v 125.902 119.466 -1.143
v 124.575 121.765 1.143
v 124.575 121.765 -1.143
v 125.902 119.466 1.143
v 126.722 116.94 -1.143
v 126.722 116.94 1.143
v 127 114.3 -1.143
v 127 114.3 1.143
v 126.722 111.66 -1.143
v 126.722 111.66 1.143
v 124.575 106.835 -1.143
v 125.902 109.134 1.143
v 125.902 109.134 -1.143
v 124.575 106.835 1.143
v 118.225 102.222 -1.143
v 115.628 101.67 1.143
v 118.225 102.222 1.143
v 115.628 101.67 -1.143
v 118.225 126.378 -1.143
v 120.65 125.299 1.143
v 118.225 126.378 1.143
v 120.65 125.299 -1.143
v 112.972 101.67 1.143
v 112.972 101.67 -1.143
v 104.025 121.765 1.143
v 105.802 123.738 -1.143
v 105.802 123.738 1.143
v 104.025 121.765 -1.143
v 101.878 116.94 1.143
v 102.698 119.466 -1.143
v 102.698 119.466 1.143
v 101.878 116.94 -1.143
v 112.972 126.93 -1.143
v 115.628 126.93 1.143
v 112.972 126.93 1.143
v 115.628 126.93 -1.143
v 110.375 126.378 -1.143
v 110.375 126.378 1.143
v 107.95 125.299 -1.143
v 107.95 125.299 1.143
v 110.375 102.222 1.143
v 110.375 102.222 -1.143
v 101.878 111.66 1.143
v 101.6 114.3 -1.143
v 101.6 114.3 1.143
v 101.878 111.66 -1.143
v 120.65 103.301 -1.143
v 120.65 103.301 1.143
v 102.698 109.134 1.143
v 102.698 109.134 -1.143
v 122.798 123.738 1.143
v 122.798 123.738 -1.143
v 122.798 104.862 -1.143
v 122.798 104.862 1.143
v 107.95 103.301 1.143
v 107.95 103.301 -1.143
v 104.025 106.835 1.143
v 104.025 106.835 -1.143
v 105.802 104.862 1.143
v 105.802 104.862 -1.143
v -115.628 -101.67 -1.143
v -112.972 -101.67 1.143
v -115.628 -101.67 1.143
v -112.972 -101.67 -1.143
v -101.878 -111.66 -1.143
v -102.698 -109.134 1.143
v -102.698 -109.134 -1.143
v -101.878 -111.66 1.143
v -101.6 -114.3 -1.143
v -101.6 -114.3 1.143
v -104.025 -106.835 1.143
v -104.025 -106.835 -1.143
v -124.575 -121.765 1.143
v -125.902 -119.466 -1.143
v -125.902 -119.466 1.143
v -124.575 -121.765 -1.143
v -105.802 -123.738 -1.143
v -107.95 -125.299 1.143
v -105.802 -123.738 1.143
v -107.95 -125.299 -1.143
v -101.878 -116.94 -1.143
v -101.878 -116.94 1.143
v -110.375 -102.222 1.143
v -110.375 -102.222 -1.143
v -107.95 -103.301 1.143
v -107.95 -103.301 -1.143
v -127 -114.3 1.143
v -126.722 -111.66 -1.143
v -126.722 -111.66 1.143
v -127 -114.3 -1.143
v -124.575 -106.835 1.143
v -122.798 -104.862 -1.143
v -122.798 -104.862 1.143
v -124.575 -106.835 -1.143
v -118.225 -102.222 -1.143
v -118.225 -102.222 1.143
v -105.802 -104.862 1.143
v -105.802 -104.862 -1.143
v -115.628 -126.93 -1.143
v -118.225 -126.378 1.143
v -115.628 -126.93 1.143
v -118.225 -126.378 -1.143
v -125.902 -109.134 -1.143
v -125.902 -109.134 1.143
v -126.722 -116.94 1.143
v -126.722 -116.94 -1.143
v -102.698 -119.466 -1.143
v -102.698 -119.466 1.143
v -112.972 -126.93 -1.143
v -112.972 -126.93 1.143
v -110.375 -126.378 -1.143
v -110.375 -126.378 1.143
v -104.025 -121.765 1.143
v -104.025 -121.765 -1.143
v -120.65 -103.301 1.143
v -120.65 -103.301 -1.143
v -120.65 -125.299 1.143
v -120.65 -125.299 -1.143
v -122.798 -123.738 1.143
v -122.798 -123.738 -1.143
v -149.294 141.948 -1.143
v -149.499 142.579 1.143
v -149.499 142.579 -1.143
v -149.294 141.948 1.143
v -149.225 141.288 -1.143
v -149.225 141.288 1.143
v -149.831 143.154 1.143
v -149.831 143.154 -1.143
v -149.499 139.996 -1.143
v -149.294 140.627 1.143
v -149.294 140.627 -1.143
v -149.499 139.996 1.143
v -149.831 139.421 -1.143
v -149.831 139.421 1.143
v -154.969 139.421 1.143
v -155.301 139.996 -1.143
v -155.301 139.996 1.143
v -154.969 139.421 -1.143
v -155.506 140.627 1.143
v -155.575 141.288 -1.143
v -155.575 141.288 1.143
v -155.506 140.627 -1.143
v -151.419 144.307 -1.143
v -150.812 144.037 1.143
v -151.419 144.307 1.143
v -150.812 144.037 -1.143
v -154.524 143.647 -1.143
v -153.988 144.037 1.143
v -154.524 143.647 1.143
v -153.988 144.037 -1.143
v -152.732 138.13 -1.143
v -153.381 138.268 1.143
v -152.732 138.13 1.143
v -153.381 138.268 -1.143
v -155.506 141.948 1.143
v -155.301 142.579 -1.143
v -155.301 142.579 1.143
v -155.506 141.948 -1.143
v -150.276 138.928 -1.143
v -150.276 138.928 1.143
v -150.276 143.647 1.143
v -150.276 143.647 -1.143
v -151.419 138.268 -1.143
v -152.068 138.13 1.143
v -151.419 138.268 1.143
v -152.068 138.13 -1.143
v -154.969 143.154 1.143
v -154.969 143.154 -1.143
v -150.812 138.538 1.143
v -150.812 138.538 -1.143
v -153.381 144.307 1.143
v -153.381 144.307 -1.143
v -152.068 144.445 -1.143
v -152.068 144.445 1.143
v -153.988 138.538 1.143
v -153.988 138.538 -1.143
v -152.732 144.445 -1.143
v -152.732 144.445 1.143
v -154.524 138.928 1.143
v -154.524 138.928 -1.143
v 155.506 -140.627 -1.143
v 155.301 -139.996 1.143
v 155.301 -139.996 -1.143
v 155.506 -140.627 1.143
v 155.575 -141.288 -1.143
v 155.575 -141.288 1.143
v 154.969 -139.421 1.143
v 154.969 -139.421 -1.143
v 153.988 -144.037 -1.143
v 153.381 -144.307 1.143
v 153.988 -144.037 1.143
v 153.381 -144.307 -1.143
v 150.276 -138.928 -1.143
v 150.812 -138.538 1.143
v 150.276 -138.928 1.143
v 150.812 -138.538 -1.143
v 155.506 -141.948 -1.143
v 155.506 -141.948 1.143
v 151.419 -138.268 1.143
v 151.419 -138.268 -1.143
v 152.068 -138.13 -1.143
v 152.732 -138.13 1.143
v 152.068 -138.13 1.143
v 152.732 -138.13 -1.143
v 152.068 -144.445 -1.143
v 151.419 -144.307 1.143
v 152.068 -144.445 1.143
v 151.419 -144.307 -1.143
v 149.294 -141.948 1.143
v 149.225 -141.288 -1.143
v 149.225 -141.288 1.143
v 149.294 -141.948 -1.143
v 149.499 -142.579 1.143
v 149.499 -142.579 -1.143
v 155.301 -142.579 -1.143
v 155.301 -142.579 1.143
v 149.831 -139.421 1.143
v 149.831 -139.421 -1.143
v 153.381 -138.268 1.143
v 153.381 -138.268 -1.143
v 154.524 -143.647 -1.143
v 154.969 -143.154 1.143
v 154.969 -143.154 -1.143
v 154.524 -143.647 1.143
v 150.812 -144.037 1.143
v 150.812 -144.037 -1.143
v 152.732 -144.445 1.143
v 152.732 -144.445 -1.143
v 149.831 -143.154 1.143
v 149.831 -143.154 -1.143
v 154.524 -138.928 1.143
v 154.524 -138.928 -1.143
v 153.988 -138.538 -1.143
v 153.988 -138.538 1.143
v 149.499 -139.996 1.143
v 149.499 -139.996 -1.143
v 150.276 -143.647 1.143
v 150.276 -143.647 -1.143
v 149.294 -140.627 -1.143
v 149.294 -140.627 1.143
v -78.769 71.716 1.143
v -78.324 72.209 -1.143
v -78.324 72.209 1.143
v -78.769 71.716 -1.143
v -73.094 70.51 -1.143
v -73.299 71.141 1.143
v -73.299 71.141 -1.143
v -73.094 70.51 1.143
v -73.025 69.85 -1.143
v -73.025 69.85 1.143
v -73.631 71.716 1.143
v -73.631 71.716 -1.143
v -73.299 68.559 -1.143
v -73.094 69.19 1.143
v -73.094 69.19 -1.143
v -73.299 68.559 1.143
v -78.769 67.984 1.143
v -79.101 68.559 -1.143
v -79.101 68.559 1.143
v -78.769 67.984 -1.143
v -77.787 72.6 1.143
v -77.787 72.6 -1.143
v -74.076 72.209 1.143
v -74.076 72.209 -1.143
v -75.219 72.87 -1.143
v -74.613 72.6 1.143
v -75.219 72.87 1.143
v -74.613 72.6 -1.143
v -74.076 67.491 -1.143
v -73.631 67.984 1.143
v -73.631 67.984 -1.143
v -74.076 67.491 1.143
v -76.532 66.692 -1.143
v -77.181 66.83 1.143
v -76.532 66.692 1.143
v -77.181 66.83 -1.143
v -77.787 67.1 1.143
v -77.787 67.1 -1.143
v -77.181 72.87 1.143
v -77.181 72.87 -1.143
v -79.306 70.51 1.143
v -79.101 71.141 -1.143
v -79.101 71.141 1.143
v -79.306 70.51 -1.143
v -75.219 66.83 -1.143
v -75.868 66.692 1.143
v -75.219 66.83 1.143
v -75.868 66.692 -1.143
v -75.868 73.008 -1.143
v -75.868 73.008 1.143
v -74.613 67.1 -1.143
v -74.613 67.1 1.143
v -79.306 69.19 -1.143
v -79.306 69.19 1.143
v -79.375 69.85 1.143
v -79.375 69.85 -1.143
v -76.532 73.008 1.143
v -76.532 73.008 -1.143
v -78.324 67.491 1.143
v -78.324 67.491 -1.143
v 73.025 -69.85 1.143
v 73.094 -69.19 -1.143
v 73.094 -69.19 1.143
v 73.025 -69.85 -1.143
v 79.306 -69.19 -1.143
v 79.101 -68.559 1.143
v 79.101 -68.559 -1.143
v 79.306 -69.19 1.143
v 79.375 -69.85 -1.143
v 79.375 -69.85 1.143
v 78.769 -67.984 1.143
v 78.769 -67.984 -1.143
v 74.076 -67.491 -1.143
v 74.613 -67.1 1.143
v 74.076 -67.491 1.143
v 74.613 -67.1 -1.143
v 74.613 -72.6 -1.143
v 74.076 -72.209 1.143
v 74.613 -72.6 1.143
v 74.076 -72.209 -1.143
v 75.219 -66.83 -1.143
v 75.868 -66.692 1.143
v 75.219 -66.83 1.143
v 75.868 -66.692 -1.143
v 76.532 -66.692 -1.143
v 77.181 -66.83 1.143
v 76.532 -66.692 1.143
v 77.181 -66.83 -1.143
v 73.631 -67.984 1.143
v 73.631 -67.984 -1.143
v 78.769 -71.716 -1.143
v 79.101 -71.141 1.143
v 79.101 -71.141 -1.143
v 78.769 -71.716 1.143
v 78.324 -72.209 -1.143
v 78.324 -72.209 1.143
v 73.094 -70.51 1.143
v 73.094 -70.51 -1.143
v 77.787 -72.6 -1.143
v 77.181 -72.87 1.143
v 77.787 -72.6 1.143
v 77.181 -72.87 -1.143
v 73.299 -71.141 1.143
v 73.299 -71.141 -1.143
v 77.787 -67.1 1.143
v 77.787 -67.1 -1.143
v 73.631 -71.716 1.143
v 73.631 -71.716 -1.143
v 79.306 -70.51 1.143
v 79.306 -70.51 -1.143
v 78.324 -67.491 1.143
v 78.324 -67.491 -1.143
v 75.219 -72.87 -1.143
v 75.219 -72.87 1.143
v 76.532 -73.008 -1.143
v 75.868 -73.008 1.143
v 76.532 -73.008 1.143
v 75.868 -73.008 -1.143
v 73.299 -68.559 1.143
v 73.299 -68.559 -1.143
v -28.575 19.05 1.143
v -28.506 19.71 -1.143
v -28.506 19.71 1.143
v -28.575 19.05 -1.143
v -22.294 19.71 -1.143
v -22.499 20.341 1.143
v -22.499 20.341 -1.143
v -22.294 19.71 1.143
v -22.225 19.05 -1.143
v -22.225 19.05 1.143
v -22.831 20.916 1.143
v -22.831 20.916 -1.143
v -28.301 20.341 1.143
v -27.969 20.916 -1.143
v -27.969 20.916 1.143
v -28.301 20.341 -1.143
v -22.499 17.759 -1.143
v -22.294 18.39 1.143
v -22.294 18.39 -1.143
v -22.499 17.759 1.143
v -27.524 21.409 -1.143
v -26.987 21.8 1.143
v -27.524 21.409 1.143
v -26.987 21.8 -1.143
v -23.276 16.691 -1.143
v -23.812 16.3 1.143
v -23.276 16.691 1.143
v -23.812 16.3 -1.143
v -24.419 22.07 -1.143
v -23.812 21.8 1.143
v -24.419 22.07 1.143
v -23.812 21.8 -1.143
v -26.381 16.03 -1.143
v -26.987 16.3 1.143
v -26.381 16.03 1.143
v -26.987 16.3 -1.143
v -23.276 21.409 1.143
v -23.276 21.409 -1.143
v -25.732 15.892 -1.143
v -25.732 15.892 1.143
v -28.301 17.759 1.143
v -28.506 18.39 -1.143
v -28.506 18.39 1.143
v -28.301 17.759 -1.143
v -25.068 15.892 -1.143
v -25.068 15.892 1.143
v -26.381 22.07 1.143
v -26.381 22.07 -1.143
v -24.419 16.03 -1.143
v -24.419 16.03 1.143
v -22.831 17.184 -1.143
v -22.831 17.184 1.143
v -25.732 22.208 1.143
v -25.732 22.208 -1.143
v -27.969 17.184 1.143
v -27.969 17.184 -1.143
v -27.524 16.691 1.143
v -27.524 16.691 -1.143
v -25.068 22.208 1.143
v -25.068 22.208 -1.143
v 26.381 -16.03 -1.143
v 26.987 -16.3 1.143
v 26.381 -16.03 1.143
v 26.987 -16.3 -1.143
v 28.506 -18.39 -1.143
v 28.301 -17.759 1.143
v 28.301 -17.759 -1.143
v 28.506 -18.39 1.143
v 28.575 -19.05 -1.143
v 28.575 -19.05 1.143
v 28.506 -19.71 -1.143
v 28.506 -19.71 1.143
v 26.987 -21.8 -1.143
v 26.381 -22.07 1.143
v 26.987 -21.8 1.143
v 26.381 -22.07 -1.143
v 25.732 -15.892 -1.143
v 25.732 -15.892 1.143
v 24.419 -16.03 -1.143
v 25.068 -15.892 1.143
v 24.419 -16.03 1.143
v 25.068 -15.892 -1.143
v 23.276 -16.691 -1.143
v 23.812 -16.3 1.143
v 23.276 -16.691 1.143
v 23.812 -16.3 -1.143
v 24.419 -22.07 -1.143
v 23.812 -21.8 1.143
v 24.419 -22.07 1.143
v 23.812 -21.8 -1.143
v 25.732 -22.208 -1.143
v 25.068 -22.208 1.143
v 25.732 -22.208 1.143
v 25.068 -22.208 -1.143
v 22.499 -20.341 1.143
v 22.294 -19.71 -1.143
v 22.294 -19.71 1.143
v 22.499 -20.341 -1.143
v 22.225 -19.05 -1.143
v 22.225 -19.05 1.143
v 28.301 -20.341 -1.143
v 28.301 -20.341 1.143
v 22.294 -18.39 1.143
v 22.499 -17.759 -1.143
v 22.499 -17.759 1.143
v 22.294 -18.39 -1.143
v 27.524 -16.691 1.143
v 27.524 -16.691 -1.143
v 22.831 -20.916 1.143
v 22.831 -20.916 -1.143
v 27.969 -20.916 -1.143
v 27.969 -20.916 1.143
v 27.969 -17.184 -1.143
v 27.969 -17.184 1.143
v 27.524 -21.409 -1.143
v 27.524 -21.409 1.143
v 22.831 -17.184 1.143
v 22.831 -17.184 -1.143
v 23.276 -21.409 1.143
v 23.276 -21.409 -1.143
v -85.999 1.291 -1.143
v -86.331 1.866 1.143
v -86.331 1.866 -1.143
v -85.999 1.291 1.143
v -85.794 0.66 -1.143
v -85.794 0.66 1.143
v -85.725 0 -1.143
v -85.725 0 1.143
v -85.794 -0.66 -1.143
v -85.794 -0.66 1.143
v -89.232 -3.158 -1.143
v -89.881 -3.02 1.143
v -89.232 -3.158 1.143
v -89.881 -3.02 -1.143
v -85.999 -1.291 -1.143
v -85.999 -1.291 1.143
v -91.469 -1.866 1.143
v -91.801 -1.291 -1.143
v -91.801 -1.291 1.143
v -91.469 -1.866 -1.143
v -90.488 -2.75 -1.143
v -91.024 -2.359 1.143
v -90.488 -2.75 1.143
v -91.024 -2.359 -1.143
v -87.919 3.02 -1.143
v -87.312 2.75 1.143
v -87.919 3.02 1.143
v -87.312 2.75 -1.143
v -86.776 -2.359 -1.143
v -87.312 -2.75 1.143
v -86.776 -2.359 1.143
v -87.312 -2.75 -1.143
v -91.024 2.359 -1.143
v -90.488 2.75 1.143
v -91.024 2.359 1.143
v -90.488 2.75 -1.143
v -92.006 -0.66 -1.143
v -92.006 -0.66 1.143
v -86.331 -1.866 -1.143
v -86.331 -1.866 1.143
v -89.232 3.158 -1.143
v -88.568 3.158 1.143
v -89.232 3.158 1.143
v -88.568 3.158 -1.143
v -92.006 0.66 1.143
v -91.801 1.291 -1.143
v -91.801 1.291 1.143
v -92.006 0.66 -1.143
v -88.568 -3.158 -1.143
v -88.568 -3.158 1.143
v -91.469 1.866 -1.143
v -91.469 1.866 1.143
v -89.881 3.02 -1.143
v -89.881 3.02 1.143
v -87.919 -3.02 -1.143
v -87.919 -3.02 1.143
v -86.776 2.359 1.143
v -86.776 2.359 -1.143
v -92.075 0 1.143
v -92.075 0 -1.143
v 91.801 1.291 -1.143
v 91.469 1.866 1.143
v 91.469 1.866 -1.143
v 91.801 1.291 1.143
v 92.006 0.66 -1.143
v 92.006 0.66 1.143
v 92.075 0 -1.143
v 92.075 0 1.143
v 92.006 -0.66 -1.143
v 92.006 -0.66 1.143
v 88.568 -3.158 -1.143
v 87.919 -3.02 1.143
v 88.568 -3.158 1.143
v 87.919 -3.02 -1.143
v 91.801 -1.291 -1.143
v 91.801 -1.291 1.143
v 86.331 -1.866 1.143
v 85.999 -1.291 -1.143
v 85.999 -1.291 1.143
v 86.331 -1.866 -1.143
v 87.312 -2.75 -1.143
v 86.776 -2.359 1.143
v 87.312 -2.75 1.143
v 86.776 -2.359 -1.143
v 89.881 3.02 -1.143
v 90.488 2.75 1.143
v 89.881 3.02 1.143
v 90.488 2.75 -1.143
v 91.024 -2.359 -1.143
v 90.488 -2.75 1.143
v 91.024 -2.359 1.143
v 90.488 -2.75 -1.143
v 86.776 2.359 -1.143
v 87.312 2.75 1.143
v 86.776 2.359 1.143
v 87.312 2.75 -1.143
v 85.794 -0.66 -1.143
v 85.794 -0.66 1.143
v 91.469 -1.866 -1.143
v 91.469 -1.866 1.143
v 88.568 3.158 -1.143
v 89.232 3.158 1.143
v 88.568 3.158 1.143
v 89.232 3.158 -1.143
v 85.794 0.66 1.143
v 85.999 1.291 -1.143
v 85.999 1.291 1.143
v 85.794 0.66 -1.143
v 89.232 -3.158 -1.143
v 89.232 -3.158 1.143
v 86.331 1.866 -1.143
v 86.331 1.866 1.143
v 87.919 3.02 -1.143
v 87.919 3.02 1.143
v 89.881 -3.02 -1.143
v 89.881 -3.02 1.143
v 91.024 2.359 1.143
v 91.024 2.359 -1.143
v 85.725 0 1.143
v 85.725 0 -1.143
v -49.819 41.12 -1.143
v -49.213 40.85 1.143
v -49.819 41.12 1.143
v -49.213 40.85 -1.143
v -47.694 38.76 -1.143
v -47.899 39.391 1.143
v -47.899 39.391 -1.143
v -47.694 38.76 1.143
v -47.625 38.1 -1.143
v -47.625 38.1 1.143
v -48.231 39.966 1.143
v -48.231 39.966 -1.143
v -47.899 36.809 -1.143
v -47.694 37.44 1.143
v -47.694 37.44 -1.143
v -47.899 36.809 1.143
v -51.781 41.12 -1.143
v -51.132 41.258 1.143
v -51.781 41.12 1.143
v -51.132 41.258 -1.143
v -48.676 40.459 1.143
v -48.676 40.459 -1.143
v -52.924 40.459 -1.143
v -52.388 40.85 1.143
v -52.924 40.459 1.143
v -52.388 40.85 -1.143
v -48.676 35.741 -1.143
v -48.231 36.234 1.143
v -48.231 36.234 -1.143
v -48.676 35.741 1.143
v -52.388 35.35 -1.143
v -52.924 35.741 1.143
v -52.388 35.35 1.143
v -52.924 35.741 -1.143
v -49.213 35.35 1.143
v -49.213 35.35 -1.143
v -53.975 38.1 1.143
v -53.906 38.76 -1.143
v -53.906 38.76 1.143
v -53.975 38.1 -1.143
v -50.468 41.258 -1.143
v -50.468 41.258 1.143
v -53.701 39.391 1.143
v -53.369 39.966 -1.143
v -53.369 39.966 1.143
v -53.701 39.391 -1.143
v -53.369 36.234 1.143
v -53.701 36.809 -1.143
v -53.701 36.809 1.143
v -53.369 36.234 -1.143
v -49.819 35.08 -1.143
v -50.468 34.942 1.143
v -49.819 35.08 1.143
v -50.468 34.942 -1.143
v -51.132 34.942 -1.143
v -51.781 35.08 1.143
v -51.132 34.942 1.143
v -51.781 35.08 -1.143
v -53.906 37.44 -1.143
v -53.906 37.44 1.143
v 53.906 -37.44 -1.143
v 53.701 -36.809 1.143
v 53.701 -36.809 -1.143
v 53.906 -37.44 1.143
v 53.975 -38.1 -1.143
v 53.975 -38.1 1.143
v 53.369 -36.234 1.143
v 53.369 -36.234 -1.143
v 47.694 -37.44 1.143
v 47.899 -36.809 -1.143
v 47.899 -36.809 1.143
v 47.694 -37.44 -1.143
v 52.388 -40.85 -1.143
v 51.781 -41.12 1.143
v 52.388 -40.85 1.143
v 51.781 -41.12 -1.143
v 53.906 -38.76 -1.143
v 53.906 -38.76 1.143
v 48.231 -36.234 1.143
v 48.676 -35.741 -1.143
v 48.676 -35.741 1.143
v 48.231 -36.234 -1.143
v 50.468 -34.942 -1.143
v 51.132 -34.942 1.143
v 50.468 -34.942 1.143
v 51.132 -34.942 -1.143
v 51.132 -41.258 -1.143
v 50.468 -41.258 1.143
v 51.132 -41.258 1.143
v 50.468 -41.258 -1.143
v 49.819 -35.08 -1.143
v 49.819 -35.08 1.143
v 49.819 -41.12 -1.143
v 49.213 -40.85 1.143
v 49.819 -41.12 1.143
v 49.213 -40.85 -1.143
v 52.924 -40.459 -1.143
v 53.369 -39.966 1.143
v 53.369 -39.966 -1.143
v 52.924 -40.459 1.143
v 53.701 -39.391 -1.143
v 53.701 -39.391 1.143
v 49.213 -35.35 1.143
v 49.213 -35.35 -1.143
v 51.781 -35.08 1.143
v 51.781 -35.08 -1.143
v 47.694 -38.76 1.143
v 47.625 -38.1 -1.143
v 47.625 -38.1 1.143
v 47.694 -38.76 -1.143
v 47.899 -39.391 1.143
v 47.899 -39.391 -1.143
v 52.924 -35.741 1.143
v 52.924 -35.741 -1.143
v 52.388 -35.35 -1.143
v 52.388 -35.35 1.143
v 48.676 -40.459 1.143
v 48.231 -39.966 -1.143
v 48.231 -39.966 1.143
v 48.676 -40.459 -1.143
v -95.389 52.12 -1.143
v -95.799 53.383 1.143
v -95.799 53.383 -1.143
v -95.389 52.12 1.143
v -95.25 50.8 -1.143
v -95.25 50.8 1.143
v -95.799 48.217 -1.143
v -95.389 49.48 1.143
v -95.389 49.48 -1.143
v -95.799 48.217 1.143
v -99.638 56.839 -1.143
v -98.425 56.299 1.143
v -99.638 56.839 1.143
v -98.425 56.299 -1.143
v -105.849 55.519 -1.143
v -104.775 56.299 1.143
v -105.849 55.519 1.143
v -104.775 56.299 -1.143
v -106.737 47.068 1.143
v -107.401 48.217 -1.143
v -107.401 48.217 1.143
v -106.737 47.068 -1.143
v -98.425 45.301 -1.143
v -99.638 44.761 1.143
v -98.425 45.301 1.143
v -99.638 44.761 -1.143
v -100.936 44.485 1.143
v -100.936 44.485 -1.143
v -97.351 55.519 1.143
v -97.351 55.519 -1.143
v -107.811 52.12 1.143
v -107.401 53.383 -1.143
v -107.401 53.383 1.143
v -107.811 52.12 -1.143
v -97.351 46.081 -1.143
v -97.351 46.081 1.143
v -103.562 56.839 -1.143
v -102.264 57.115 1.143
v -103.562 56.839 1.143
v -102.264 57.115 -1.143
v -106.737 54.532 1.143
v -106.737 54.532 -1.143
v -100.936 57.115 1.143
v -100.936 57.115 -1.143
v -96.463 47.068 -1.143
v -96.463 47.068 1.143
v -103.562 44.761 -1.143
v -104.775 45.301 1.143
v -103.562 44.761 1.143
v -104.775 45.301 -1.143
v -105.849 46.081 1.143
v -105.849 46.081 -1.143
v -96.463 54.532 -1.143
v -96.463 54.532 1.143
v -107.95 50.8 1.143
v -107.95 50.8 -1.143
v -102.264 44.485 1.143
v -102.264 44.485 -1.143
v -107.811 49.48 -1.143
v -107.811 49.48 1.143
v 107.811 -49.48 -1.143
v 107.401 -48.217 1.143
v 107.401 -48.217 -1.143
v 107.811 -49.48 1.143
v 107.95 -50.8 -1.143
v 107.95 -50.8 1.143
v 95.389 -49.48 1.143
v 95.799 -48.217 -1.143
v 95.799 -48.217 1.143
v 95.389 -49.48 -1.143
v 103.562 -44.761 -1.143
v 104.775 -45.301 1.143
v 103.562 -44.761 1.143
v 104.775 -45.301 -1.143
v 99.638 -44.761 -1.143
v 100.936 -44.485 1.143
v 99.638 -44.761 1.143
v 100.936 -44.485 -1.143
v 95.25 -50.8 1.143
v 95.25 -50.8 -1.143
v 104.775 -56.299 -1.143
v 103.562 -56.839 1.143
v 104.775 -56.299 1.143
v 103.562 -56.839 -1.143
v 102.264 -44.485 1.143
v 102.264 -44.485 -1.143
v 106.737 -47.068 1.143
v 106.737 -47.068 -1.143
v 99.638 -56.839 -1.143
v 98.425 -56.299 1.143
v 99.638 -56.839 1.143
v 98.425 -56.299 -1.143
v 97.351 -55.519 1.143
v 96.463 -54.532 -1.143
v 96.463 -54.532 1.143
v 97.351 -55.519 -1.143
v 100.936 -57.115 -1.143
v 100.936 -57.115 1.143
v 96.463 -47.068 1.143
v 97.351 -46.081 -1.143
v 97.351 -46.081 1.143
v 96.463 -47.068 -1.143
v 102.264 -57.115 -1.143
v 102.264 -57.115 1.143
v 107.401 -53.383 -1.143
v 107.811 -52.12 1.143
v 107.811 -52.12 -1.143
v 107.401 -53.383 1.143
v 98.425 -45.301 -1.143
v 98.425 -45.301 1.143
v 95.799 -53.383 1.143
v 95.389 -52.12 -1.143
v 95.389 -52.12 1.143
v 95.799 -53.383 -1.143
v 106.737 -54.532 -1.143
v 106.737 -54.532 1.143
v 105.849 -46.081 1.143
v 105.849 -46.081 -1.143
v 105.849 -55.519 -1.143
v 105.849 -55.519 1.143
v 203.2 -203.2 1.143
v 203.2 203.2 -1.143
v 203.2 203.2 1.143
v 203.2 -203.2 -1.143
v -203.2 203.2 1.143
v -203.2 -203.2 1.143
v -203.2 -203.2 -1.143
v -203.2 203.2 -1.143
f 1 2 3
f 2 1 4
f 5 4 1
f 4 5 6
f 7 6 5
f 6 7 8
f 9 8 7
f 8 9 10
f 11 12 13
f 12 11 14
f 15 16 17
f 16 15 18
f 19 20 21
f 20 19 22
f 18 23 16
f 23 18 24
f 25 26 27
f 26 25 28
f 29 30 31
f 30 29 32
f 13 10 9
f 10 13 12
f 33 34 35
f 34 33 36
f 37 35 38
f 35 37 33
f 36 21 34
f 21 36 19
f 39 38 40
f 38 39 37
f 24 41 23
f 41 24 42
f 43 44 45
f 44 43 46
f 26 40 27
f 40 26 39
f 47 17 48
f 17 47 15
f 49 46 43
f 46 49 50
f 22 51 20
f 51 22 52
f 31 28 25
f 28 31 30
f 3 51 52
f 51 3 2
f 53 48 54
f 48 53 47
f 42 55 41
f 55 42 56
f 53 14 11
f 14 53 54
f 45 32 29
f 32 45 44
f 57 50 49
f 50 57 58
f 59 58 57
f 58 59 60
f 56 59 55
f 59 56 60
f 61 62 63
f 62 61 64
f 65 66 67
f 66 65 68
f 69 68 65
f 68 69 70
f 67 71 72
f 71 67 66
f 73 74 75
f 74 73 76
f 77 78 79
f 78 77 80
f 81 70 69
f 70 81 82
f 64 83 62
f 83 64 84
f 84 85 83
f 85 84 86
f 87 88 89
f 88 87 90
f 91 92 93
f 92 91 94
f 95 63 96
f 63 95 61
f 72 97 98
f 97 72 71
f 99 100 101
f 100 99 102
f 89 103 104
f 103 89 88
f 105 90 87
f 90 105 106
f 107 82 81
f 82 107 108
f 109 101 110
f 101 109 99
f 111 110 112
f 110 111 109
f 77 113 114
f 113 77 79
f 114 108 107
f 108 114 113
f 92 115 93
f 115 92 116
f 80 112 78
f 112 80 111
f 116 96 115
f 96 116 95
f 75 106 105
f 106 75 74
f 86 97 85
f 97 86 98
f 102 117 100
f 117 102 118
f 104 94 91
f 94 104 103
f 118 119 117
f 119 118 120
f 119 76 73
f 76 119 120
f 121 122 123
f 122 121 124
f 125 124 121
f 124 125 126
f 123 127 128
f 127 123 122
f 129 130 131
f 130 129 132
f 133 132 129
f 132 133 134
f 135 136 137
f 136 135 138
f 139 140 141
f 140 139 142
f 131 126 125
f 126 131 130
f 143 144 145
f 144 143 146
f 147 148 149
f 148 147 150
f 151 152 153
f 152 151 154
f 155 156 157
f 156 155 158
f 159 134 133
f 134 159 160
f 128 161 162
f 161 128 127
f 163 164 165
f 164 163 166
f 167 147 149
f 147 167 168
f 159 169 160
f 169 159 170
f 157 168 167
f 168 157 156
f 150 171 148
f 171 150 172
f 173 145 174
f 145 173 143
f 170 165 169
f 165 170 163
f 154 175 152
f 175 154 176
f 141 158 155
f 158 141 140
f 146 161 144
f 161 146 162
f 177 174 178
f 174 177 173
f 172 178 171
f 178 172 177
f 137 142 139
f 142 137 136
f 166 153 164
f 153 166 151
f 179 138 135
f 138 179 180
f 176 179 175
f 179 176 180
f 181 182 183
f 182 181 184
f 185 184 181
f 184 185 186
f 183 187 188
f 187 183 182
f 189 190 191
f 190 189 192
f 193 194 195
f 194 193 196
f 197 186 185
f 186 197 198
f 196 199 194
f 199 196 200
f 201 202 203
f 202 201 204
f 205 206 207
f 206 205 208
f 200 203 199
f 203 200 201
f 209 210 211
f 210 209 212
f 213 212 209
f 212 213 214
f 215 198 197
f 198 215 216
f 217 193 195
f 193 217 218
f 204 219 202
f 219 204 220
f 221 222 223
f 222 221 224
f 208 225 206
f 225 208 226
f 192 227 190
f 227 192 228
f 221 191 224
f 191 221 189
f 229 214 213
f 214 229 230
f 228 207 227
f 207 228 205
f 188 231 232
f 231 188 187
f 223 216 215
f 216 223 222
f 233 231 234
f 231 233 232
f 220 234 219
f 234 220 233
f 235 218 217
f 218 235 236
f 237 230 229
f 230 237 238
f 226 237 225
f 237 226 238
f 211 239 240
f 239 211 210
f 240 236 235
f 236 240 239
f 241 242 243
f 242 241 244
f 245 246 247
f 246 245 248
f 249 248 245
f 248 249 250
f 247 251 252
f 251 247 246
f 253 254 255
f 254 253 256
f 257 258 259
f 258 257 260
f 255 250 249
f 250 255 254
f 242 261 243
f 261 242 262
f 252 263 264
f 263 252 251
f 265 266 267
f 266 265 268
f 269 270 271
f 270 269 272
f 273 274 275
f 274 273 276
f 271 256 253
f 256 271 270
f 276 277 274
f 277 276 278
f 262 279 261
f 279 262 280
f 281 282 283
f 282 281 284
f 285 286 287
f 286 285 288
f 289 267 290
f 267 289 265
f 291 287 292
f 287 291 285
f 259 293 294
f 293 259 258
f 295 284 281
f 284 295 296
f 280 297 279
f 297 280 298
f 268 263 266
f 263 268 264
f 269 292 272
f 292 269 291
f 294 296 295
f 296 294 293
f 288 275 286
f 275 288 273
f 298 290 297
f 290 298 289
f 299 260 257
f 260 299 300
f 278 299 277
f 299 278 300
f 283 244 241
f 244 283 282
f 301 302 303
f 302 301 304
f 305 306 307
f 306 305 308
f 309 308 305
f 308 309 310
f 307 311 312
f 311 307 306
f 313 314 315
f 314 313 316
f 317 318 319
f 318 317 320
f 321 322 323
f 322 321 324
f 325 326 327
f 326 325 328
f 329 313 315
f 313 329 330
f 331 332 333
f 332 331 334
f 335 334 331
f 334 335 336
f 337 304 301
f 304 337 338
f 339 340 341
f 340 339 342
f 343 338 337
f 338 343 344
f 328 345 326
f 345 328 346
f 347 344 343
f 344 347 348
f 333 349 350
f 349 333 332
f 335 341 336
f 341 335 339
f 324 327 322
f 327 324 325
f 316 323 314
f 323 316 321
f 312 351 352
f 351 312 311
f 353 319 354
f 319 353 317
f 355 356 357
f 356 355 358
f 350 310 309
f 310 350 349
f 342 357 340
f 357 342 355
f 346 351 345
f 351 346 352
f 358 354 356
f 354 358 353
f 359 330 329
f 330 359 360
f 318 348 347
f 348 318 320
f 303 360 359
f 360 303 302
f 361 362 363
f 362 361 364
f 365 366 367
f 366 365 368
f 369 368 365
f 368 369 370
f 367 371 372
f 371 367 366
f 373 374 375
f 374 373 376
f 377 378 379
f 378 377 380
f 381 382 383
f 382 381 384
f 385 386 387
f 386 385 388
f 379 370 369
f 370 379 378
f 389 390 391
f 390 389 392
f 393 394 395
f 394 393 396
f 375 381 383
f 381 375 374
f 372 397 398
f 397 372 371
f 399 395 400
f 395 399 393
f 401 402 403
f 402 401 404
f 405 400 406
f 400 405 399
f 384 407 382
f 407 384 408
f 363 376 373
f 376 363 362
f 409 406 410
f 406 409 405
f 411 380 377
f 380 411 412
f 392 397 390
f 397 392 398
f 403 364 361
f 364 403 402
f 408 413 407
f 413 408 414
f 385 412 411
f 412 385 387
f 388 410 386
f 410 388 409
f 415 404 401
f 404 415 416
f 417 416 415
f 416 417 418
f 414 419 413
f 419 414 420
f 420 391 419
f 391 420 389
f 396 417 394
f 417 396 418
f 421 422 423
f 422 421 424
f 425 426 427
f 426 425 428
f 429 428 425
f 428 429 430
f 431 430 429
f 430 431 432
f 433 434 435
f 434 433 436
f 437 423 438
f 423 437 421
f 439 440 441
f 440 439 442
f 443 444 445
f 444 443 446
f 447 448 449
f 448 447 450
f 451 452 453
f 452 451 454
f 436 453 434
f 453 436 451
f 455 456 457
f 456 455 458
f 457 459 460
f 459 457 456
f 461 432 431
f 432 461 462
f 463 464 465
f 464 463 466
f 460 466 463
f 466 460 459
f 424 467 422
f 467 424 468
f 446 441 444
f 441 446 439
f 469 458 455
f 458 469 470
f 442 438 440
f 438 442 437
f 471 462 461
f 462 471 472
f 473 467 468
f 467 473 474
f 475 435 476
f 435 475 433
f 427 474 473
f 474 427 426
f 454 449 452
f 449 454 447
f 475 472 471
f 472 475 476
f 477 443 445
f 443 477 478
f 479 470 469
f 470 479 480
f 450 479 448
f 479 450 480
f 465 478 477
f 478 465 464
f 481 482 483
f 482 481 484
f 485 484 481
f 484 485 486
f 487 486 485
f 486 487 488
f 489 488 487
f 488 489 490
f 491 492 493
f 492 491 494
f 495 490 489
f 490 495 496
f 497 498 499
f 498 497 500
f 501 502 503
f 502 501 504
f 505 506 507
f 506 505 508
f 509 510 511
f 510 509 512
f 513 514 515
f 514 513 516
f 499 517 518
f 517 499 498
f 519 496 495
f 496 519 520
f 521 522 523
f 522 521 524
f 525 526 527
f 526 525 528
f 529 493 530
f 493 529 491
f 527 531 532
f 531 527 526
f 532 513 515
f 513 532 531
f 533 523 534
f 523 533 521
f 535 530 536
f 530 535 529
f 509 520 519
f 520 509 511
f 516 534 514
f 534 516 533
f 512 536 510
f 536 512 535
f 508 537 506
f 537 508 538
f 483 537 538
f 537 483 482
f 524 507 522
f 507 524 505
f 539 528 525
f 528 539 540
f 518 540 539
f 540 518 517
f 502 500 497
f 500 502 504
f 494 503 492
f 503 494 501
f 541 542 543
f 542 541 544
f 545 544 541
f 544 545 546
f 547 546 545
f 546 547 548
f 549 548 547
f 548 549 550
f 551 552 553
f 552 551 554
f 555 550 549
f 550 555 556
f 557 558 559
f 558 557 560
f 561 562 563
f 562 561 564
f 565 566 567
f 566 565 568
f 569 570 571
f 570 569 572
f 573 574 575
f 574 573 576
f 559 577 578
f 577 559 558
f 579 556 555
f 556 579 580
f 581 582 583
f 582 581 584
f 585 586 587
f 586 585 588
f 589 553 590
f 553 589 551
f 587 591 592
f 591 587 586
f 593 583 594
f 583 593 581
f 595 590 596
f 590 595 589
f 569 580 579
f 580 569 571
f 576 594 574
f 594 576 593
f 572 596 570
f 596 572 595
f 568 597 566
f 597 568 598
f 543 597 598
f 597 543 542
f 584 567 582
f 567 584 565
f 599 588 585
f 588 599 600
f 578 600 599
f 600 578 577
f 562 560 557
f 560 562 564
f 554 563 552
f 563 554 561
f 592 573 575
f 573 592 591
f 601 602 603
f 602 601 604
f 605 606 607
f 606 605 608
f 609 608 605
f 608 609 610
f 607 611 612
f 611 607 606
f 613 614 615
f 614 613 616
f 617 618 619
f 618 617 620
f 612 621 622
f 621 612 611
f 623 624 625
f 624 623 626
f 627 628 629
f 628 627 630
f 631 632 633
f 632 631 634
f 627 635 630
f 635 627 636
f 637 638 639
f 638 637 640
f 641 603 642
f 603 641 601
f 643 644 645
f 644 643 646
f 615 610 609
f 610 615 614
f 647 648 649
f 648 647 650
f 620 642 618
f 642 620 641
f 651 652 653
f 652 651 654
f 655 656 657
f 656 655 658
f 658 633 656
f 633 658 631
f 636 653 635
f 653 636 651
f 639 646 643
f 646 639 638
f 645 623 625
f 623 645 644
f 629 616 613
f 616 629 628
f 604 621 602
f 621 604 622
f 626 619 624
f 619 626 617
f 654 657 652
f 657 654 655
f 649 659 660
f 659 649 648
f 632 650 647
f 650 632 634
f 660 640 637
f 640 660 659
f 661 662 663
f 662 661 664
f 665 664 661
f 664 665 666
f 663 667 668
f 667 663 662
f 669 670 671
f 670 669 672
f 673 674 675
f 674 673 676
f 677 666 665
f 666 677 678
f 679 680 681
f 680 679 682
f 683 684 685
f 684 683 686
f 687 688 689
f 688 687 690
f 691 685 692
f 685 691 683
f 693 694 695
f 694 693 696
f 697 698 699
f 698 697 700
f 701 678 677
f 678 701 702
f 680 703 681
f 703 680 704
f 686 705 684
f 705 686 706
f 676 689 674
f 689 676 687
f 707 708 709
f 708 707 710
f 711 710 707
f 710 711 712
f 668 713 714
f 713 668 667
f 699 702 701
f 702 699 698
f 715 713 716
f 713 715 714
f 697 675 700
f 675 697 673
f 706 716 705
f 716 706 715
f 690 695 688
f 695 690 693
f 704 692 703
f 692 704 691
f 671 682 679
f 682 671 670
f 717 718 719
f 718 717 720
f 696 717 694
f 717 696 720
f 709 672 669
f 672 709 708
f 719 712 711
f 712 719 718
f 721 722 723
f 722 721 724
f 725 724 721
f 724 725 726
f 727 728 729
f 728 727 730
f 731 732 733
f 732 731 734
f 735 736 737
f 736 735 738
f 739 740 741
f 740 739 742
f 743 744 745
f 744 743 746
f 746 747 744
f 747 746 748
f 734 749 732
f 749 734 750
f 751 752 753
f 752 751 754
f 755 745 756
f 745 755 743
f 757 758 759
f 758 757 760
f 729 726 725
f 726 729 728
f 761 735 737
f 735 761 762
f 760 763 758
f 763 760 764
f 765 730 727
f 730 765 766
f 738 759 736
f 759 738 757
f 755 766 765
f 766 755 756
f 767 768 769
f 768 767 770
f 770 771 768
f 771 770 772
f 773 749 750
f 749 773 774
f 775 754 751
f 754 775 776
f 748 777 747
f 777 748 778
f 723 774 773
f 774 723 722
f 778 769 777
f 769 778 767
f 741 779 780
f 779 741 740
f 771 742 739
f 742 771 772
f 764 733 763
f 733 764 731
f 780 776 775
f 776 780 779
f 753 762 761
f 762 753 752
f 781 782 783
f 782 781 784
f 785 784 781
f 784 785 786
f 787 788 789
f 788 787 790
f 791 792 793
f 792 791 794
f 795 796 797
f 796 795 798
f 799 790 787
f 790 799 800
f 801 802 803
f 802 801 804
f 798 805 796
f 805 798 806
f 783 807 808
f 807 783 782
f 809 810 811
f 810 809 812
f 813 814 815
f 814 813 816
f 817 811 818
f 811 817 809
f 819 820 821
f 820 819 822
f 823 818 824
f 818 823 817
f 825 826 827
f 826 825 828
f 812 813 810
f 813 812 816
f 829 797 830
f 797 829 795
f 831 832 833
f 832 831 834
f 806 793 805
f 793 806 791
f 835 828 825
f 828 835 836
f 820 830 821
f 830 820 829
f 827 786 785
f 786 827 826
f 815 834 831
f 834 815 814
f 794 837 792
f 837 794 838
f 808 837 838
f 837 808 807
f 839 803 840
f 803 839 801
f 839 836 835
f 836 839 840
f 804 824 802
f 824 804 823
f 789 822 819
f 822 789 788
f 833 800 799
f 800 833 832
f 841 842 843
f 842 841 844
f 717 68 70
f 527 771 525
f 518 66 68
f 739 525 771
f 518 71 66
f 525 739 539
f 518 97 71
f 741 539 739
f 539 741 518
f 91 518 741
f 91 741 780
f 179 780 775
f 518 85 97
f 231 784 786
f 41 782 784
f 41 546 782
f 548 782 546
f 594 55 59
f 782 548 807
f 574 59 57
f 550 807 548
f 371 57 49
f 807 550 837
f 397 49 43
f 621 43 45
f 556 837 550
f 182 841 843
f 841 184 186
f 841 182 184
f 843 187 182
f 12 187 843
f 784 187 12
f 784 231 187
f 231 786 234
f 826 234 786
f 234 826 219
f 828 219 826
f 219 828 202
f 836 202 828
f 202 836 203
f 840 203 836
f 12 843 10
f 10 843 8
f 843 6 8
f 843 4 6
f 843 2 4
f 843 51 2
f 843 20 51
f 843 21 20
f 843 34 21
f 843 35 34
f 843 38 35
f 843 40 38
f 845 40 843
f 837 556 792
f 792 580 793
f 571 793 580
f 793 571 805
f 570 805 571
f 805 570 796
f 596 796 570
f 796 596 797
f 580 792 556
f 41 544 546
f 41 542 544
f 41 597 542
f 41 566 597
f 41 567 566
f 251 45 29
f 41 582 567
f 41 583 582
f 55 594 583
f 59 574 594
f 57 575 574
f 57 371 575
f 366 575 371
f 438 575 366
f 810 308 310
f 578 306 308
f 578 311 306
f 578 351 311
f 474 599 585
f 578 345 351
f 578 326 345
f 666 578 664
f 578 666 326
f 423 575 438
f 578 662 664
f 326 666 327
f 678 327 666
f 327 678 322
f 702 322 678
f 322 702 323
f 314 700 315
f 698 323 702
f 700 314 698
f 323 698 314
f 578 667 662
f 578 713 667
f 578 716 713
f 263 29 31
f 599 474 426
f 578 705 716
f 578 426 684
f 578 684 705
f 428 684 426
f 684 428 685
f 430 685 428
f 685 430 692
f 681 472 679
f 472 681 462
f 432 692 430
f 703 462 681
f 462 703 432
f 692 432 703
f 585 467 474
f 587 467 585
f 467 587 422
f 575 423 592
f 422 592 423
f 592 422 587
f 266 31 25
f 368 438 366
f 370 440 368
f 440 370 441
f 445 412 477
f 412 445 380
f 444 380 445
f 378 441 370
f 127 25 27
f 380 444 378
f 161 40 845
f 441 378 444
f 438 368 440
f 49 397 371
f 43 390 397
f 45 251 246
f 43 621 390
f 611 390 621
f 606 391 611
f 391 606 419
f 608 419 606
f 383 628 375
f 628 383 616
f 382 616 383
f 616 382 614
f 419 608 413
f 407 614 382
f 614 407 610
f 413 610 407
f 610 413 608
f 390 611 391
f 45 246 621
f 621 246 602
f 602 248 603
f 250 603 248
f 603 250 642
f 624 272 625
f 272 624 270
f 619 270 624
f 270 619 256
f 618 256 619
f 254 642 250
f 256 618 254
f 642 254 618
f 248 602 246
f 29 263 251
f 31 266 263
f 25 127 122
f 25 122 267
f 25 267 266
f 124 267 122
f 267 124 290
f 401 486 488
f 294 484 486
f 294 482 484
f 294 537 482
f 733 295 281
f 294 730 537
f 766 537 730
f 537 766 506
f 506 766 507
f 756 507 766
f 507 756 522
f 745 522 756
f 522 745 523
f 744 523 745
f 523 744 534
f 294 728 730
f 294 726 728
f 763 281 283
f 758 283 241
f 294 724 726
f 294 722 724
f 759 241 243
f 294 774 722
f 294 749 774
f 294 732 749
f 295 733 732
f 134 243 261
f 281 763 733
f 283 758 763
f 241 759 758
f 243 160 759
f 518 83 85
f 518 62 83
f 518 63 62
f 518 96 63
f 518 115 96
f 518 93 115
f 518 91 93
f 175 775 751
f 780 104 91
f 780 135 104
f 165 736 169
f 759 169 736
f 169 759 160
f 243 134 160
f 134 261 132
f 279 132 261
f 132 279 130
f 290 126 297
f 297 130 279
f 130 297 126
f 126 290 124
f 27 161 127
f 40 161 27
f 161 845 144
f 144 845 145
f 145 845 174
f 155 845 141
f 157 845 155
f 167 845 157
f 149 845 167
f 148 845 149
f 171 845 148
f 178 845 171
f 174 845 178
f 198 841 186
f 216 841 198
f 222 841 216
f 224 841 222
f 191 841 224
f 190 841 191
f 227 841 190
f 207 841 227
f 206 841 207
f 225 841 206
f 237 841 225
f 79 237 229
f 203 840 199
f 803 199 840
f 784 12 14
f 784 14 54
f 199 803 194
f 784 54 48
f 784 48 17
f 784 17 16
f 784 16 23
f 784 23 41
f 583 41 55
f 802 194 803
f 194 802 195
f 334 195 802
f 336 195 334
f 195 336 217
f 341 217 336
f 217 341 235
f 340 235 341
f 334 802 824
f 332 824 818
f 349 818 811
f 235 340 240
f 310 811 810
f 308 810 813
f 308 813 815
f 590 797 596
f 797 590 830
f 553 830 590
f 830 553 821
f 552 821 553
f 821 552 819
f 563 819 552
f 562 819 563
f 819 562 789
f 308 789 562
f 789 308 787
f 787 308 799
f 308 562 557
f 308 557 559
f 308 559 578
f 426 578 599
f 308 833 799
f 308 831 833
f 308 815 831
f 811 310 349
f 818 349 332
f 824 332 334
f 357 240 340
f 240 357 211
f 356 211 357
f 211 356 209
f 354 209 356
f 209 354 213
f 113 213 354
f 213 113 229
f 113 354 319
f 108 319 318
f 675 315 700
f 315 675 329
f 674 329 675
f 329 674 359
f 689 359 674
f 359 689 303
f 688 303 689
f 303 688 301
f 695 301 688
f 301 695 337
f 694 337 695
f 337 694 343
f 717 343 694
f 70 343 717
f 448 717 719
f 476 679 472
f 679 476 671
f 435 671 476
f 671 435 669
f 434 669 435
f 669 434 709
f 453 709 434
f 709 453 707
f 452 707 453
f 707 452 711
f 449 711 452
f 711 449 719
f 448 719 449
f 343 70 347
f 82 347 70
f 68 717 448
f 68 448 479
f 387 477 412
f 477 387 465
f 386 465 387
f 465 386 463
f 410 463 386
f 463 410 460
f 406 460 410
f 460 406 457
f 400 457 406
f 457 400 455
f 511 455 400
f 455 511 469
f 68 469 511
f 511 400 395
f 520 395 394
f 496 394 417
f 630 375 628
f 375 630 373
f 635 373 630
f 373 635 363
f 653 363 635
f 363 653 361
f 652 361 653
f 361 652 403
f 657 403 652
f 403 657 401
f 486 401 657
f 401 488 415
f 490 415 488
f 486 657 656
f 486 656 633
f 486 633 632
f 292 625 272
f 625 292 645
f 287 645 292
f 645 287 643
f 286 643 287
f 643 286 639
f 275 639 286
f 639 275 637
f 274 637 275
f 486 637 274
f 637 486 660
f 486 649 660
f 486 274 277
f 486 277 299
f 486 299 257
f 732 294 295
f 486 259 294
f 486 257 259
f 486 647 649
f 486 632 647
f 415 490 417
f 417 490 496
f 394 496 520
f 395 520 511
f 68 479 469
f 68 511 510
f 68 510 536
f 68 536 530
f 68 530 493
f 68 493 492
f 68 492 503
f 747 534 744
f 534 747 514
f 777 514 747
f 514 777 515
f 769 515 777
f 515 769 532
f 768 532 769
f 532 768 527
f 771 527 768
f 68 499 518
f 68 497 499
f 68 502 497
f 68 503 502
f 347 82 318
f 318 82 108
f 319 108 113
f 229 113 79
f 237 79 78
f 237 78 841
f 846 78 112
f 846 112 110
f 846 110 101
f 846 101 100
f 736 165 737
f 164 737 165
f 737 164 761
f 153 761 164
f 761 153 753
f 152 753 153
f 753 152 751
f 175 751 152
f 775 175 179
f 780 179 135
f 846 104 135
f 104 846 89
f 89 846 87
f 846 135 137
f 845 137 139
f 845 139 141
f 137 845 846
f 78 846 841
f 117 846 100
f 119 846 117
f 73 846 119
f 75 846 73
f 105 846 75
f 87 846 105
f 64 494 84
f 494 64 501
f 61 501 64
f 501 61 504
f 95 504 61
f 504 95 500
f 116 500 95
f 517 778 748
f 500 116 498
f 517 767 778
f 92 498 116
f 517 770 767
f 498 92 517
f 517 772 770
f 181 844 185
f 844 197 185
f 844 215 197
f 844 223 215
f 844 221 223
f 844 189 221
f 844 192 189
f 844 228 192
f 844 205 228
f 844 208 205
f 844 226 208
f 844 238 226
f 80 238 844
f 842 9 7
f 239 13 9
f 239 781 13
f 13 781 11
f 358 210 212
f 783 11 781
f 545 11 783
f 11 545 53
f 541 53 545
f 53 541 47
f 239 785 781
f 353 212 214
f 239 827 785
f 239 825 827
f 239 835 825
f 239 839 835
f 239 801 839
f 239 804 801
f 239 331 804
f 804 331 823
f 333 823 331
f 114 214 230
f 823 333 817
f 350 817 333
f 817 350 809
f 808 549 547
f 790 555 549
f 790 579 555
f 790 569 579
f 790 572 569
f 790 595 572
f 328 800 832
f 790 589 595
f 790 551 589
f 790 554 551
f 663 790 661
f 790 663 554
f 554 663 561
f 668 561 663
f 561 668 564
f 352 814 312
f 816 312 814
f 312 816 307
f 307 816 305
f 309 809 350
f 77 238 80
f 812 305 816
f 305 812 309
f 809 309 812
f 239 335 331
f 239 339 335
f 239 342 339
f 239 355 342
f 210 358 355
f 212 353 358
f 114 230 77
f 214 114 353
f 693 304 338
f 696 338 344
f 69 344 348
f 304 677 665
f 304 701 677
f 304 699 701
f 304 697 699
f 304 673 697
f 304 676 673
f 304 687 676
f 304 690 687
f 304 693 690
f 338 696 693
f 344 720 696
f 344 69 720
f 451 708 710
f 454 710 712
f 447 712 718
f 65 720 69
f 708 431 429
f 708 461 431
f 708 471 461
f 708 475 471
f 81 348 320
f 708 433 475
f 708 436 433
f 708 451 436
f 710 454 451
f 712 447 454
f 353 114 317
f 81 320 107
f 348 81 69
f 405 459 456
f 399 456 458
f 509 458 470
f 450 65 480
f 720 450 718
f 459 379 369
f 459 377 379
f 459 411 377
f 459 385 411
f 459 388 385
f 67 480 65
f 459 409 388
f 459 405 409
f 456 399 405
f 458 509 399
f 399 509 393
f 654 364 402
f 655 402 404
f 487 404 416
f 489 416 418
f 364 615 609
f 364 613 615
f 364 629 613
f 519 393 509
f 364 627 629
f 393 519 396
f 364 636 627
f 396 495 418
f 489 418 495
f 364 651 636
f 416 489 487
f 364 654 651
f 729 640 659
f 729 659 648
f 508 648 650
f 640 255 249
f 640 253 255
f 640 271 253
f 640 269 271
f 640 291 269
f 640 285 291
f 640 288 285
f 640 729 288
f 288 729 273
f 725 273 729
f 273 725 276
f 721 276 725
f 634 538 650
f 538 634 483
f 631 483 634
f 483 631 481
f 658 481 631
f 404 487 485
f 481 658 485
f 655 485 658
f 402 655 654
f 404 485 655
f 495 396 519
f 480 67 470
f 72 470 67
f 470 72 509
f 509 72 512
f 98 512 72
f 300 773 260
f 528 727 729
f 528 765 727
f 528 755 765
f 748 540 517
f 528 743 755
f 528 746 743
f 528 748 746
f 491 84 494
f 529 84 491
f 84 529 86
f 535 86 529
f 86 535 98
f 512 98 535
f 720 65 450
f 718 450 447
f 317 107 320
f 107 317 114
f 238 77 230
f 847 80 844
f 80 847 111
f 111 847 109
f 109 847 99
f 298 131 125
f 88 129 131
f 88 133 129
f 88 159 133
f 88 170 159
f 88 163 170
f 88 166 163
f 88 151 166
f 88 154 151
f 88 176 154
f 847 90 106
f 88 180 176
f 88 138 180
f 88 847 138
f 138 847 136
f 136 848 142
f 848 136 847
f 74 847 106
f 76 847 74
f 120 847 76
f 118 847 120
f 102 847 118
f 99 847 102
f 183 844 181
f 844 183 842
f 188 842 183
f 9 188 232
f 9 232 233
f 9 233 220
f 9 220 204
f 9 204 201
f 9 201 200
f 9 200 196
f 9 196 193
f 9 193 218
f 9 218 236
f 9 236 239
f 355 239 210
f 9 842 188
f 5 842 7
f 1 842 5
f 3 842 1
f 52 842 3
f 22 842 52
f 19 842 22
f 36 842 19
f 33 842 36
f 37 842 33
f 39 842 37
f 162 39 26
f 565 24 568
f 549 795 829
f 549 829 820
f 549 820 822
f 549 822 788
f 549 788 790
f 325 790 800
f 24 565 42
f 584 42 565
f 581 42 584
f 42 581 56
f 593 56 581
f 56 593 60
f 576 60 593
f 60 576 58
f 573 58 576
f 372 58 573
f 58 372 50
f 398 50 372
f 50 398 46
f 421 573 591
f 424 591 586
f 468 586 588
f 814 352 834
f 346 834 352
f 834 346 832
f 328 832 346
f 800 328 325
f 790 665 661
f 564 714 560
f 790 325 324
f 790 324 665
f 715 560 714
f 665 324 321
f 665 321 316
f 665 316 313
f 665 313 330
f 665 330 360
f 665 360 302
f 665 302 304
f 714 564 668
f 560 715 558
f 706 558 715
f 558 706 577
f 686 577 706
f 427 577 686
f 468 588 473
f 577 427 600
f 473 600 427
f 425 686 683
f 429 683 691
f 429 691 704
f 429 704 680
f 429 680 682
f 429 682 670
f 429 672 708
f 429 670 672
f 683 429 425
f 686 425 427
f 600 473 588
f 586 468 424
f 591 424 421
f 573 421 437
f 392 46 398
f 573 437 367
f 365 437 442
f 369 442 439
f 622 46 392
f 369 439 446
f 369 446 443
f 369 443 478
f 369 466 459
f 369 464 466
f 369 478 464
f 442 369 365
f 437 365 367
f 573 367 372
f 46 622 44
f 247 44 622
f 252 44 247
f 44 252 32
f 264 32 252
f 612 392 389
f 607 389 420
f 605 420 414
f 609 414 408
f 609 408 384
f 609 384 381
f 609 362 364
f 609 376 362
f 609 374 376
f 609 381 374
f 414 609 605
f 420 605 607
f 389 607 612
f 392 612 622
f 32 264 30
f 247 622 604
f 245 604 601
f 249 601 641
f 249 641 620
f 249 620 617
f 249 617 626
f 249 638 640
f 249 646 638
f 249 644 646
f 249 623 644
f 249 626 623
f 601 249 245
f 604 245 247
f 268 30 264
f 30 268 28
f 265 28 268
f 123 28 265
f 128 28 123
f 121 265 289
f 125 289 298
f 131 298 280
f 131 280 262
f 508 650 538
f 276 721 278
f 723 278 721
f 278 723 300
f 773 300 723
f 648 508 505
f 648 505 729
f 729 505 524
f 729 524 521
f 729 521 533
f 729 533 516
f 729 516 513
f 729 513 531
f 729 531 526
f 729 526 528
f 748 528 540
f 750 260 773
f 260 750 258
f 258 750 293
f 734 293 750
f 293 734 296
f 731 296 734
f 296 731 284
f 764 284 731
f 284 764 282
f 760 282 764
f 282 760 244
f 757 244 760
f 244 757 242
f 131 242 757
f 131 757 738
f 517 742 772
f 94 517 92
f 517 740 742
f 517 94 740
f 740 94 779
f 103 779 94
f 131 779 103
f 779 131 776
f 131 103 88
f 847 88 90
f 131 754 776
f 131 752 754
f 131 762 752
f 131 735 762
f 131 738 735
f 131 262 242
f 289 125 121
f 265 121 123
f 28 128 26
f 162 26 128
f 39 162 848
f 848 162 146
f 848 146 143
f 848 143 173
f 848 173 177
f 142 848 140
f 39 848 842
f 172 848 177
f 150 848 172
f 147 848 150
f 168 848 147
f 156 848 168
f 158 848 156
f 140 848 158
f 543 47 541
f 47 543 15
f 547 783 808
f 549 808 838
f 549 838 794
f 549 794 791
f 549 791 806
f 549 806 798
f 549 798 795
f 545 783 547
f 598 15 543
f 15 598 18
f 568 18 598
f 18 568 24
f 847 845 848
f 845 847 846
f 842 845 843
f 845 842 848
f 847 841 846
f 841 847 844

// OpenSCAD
// tape cleaner enclosure top
// Erik Piil
//piil.erik@gmail.com
//https://github.com/epiil/tape-cleaner
//v20150310

//OUTER DIMENSIONS in mm

outerWidth=406.4;
outerLength=406.4;
outerHeight=2.286;


module top()
{
	difference() 
	{
		union() 
		{
			cube(size=[outerWidth, outerLength, outerHeight], center = true, $fs=.01);
		}
		union() 
		{
			translate([114.3,114.3,0])
			cylinder(h=5, d=25.4, center = true, $fs=.01);
             translate([-114.3,-114.3,0])
			cylinder(h=5, d=25.4, center = true, $fs=.01);
             translate([-152.4,141.2875,0])
			cylinder(h=5, d=6.35, center = true, $fs=.01);
             translate([152.4,-141.2875,0])
			cylinder(h=5, d=6.35, center = true, $fs=.01);
             translate([-76.2,69.85,0])
			cylinder(h=5, d=6.35, center = true, $fs=.01);
             translate([76.2,-69.85,0])
			cylinder(h=5, d=6.35, center = true, $fs=.01);
             translate([-25.4,19.05,0])
			cylinder(h=5, d=6.35, center = true, $fs=.01);
             translate([25.4,-19.05,0])
			cylinder(h=5, d=6.35, center = true, $fs=.01);
             translate([-88.9,0,0])
			cylinder(h=5, d=6.35, center = true, $fs=.01);
             translate([88.9,0,0])
			cylinder(h=5, d=6.35, center = true, $fs=.01);
             translate([-50.8,38.1,0])
			cylinder(h=5, d=6.35, center = true, $fs=.01);
             translate([50.8,-38.1,0])
			cylinder(h=5, d=6.35, center = true, $fs=.01);
             translate([-101.6,50.8,0])
			cylinder(h=5, d=12.7, center = true, $fs=.01);
             translate([101.6,-50.8,0])
			cylinder(h=5, d=12.7, center = true, $fs=.01);
		}
	}
}

top();
